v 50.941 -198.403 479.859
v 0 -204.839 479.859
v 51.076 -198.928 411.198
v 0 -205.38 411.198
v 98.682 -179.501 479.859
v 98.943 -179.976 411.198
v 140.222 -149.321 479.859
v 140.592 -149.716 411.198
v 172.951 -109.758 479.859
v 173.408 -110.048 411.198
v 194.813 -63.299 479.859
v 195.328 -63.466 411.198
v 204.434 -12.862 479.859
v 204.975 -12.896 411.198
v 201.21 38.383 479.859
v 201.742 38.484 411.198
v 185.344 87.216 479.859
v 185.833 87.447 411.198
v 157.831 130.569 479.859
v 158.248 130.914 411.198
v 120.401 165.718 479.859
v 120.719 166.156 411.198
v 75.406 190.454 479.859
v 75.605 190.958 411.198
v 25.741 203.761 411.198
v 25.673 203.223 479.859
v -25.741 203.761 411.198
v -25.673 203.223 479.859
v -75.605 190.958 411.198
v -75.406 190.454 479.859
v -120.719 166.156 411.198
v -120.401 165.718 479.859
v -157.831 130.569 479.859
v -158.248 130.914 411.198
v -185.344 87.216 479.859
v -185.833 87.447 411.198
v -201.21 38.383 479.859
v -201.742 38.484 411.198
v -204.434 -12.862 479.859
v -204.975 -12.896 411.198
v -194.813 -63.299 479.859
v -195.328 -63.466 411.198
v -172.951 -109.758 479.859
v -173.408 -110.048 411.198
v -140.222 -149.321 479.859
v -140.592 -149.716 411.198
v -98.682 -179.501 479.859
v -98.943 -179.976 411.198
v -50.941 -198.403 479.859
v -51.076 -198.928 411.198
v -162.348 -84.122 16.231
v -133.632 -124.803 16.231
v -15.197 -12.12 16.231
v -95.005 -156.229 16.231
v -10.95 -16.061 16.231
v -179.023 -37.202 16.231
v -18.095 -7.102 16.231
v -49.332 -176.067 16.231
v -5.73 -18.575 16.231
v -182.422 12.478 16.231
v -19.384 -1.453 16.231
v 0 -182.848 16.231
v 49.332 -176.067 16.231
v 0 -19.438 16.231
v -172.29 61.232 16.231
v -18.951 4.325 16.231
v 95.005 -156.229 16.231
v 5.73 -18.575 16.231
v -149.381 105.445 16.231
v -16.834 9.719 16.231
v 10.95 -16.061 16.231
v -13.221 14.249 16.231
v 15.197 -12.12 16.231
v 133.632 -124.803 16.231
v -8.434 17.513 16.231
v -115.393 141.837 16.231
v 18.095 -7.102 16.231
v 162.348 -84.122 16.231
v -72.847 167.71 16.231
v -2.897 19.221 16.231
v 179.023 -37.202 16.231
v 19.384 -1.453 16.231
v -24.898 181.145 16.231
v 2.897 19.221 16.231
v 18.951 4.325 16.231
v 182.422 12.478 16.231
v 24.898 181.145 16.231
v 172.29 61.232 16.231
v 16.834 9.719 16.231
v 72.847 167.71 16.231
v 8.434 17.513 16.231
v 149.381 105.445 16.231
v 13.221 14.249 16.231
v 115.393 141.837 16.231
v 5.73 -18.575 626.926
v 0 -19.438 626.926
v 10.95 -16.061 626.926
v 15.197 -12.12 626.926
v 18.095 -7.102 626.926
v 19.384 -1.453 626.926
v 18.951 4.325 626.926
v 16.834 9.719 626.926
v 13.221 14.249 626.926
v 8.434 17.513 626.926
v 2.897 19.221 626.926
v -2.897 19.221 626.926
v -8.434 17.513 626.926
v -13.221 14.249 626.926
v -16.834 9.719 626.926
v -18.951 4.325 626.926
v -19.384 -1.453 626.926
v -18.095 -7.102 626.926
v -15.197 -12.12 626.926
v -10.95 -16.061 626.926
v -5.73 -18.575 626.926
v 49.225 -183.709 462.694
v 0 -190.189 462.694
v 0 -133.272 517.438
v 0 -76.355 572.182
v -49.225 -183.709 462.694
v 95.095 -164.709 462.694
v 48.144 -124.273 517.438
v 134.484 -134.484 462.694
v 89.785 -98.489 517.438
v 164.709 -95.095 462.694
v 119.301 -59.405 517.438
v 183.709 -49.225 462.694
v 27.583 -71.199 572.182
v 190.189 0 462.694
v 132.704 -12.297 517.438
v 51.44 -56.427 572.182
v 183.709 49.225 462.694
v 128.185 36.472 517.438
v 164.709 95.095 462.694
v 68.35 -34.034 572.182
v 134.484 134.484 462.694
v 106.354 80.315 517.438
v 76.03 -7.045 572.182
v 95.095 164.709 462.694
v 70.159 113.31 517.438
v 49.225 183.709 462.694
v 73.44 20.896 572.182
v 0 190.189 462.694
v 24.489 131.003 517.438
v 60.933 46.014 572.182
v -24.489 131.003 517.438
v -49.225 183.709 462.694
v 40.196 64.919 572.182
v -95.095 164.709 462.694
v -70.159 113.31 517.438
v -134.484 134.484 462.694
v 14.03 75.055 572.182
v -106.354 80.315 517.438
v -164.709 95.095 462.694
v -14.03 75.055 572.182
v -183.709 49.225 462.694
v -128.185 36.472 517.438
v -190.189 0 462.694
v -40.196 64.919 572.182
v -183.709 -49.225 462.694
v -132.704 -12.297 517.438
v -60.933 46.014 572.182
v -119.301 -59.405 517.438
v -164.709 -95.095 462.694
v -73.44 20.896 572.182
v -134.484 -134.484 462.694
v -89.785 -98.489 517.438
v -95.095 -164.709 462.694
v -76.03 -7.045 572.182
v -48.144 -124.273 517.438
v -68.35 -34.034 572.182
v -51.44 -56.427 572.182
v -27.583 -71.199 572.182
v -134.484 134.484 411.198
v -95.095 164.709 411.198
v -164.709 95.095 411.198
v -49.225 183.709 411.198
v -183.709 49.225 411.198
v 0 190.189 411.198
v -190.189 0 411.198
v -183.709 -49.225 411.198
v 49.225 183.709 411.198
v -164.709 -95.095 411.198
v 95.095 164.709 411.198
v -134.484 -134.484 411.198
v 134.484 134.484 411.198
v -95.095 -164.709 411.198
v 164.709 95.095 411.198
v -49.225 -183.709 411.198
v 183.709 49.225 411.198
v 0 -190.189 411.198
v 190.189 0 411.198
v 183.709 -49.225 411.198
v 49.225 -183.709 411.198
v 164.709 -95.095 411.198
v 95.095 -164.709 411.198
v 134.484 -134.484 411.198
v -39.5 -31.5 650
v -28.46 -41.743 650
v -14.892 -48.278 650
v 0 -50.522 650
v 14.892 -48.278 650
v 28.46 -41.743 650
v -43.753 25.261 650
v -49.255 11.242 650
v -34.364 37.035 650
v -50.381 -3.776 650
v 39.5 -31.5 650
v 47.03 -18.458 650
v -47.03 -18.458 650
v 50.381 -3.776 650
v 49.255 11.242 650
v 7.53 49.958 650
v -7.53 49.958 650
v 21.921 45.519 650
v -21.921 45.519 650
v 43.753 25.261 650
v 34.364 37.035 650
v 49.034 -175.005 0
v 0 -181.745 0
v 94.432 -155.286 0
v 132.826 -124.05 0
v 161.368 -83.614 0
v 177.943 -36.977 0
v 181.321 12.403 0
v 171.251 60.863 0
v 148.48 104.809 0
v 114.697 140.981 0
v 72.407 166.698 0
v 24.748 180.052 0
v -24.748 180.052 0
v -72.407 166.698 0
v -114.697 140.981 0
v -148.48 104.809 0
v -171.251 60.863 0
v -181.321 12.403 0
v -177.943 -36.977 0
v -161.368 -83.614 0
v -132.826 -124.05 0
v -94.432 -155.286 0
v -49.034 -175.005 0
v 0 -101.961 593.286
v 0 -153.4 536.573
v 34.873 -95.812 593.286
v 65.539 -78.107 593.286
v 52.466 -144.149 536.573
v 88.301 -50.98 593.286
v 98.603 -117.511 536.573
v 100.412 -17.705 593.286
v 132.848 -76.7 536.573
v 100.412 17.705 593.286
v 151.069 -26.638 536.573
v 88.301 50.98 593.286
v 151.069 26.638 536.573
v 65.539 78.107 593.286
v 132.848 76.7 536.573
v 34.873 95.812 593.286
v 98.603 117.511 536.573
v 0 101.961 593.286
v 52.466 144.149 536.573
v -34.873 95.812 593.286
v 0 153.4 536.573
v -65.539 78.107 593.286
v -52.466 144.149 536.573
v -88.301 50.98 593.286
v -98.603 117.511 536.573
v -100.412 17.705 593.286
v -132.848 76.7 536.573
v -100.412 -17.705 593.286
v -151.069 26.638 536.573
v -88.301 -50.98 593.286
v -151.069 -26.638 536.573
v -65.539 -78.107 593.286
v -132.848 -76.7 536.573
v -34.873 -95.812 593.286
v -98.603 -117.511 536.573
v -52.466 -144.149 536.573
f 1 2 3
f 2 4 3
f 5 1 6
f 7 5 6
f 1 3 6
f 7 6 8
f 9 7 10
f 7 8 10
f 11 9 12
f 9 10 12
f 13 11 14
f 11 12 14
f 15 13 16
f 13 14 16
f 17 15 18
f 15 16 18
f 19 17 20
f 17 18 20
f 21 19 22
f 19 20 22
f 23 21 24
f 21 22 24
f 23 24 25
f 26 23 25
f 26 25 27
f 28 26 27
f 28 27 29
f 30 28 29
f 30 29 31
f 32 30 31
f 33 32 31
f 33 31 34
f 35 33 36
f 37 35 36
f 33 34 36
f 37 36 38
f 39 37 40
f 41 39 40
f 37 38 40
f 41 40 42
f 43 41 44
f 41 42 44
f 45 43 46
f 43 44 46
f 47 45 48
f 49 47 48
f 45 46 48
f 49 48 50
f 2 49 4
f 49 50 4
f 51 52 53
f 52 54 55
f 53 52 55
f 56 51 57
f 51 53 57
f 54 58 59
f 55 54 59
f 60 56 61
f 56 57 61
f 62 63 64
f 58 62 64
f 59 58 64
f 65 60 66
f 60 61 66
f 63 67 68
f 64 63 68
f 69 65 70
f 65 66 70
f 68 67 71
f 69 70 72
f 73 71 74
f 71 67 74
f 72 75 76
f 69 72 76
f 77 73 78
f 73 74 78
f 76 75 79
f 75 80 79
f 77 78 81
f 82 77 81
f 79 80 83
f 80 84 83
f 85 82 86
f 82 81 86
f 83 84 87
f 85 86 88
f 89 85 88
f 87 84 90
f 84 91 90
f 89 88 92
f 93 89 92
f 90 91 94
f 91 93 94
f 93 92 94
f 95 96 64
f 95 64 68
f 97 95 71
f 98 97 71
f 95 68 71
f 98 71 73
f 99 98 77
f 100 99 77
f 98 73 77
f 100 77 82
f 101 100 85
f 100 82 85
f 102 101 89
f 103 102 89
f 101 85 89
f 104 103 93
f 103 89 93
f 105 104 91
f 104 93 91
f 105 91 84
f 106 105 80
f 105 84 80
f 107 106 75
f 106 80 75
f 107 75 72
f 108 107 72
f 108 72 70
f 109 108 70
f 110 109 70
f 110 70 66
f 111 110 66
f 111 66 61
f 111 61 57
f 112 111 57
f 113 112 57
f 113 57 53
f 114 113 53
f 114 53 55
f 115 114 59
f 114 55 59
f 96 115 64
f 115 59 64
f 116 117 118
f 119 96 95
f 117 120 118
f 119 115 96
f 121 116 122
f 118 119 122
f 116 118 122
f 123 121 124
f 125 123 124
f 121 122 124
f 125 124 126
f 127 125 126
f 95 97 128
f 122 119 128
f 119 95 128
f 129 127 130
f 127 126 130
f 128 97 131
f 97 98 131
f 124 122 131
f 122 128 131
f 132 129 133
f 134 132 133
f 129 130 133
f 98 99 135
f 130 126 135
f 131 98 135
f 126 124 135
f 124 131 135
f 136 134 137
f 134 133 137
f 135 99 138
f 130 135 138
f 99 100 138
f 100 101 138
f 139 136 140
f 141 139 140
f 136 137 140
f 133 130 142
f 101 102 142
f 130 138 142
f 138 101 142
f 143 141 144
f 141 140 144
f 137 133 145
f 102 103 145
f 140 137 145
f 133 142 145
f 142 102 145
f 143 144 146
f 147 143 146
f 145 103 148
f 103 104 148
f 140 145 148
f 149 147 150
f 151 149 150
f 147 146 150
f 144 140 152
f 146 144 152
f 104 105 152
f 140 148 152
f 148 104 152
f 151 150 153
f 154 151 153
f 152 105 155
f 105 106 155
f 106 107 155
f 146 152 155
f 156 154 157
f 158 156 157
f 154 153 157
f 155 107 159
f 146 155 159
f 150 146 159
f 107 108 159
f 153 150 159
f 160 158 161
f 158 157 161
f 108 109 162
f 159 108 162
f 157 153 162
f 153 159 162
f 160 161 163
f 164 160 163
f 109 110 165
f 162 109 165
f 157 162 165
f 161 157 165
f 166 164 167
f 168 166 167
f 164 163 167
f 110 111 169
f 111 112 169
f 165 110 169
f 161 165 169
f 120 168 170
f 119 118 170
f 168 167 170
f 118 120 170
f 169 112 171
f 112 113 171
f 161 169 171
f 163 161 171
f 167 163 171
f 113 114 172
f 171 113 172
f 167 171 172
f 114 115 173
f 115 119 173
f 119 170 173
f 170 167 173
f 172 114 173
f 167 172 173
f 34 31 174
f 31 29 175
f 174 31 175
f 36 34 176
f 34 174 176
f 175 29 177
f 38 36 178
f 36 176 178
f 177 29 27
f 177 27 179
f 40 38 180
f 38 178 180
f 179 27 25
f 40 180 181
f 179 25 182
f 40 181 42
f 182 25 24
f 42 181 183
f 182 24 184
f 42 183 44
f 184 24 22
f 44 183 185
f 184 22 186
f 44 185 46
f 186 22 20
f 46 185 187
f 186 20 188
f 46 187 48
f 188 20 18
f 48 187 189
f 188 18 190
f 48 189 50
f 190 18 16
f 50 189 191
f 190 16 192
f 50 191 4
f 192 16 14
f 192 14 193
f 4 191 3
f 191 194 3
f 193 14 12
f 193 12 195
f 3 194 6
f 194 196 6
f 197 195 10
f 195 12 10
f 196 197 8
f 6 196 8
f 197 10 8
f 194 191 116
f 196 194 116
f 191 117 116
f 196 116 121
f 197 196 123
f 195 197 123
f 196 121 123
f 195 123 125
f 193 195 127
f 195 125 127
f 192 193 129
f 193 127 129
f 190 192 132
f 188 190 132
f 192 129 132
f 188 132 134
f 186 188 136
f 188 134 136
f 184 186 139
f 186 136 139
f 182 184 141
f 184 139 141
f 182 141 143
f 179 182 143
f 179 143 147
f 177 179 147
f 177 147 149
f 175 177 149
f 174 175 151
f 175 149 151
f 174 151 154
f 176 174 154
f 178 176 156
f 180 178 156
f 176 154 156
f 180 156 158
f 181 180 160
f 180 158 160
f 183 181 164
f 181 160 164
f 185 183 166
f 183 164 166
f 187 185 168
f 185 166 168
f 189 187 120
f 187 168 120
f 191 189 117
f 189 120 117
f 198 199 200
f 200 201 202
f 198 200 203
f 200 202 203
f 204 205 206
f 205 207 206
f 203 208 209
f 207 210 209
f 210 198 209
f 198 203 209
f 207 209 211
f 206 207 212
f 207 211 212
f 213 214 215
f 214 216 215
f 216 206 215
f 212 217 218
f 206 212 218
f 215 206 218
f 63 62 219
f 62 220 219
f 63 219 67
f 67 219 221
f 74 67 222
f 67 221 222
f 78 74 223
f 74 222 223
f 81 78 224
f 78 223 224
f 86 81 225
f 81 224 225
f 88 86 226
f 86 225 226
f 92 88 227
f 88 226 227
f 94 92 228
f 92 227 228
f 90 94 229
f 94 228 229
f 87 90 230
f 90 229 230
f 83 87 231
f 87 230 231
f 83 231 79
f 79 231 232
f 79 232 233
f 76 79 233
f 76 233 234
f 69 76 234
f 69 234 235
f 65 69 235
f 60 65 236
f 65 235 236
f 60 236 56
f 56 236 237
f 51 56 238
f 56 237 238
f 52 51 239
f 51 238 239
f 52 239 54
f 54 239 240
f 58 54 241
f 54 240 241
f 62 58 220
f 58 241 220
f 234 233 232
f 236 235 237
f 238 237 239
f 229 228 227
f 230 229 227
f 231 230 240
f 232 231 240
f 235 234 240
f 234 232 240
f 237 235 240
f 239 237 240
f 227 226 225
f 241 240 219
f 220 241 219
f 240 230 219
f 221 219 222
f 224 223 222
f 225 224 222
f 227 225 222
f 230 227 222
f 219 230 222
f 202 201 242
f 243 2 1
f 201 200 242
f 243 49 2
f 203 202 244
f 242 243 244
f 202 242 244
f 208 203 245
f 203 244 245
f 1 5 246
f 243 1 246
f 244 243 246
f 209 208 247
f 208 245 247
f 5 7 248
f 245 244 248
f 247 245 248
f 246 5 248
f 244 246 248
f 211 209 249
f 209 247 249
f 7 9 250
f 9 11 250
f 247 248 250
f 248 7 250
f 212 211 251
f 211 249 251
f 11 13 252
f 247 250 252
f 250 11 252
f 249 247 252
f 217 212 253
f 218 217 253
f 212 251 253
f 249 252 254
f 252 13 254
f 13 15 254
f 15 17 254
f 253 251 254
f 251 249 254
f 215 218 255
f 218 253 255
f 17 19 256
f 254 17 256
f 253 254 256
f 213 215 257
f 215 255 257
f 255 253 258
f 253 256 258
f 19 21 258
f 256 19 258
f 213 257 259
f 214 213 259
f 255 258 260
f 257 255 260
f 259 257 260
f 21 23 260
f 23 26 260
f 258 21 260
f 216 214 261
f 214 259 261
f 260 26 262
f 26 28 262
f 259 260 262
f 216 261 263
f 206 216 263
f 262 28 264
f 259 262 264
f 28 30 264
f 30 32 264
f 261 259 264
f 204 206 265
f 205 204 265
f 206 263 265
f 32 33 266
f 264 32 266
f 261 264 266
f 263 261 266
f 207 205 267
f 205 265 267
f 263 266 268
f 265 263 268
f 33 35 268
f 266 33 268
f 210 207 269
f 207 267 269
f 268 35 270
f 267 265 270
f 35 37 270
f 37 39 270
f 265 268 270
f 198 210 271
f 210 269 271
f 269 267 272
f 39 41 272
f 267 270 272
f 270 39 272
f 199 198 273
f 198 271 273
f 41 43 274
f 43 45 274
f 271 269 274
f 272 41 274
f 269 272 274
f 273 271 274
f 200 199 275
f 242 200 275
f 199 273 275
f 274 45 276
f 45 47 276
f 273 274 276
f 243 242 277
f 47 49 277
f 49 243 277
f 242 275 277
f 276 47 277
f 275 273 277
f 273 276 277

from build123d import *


with BuildPart() as part:
    # Sketch → Revolution (revolve)
    with BuildSketch(Plane.YZ):
        Polygon((0, 0), (0, 650), (-50.522072, 650), (-204.838623, 479.859444), (-205.380112, 411.197937), (-190.189499, 411.197937), (-190.189499, 462.693711), (-19.438213, 626.926208), (-19.438213, 16.230762), (-182.847931, 16.230762), (-181.744675, 0), align=None)
    revolve(axis=Axis((0, 0, 0), (0, 0, 1)))


solid = part.part
